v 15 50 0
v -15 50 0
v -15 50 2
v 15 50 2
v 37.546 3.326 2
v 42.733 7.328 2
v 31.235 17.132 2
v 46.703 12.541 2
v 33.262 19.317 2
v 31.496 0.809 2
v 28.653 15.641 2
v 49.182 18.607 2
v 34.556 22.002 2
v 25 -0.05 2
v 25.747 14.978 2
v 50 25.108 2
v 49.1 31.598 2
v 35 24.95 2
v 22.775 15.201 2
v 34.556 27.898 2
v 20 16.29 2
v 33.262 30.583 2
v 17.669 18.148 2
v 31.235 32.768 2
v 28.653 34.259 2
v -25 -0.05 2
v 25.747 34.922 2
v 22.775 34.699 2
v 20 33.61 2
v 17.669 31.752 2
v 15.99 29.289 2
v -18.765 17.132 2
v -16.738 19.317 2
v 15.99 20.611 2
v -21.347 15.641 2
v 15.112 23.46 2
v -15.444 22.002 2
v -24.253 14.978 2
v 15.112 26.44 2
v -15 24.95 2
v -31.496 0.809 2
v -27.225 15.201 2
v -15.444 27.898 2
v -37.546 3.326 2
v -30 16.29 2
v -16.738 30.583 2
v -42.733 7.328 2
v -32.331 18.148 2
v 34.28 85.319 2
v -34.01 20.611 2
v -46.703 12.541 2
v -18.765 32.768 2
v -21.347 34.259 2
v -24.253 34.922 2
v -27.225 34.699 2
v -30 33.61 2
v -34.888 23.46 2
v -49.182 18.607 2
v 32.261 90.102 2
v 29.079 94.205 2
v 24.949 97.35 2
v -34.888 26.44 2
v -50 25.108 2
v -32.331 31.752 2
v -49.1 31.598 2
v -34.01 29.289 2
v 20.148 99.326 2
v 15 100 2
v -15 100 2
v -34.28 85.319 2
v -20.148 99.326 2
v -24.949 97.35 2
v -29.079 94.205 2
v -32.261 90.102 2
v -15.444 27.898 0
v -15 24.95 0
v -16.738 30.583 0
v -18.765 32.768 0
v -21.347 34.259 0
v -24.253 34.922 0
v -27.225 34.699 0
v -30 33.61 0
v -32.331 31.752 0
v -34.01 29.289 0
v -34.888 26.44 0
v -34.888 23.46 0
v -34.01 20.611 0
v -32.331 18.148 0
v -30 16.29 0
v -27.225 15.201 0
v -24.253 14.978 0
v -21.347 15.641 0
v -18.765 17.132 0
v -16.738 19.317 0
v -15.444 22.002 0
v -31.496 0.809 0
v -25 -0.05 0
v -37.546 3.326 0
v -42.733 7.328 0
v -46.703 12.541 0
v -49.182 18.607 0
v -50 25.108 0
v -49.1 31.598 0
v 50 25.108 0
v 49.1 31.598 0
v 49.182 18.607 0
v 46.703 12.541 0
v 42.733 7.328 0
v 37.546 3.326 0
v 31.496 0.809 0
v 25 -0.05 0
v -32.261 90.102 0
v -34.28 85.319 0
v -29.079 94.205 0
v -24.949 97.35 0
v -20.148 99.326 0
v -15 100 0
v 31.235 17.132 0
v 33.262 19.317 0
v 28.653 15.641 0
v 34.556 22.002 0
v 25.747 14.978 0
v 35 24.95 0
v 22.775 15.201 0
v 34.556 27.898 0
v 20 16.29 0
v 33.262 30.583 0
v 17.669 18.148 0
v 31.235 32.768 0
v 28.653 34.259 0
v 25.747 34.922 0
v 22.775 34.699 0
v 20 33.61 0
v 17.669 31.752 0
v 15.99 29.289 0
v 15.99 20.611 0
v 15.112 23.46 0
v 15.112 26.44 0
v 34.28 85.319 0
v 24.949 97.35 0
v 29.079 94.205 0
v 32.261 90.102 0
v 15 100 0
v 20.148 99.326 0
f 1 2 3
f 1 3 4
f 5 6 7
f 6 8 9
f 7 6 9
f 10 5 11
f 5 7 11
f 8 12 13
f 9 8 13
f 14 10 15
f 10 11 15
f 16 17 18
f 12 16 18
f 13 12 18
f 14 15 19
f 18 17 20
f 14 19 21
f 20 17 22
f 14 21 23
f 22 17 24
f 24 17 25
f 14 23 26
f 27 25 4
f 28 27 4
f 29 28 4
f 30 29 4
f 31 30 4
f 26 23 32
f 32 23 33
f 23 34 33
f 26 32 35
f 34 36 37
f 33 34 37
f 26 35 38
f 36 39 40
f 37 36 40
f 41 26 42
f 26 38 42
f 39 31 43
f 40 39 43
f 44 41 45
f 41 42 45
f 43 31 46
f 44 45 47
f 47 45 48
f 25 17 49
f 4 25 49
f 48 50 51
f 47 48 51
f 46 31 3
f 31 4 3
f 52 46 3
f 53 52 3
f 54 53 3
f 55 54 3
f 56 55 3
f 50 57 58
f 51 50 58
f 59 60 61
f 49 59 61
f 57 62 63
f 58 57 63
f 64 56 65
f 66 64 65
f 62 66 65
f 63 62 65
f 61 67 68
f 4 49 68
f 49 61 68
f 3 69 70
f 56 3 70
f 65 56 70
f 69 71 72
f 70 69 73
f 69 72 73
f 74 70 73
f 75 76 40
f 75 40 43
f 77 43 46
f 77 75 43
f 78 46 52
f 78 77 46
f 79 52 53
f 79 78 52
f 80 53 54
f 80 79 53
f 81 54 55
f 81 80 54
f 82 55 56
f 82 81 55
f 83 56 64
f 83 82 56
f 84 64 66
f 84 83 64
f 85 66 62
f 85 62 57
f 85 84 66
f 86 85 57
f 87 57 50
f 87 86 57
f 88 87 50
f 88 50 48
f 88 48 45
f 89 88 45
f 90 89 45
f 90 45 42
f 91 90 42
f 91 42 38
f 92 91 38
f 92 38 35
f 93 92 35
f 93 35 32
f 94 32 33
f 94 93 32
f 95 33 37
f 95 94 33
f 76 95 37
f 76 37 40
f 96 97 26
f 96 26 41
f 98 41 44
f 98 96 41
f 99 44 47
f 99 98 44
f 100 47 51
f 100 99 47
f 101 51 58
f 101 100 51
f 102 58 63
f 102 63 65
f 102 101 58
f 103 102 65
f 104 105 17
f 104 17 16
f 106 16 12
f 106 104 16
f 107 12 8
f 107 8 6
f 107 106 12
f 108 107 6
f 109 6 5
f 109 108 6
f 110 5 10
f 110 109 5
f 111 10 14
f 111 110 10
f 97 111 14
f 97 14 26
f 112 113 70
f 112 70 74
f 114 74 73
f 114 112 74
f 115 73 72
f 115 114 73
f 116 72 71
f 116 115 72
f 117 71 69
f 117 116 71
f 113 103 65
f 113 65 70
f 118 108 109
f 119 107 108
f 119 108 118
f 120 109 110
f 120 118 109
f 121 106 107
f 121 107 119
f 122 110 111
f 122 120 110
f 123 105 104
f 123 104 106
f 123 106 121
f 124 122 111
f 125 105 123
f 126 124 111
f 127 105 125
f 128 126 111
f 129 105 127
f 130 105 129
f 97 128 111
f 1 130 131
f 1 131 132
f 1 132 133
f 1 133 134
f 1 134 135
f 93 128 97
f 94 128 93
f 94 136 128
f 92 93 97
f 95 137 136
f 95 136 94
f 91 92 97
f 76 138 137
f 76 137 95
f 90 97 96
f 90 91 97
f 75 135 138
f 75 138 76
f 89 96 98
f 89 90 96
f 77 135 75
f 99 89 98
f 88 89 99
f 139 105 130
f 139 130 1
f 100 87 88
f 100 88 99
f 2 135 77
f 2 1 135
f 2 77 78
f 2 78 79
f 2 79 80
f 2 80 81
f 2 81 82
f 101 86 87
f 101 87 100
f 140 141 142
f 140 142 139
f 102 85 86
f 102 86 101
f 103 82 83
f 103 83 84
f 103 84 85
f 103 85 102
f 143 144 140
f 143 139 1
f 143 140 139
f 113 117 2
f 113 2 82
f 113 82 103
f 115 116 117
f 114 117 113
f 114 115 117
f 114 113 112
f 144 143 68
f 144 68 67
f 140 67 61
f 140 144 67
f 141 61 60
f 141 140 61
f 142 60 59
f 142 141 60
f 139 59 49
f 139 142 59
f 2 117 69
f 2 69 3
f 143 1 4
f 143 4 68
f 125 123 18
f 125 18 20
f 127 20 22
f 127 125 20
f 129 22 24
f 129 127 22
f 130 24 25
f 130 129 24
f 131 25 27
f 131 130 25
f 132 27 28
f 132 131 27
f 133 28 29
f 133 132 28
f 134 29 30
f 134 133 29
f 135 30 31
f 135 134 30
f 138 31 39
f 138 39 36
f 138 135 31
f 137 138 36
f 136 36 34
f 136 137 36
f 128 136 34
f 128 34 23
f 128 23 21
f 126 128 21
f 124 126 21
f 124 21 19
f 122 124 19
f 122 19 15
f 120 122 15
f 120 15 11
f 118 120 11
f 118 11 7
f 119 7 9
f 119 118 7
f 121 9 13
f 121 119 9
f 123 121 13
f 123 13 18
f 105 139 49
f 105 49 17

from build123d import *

# Parameters (mm, degrees)
IZIM2_R                     = 10
Y_KSEKLIK_EKSTR_ZYON1_DEPTH = 2


with BuildPart() as part:
    # Çizim2 → Yükseklik-Ekstrüzyon1 (new body)
    with BuildSketch(Plane.XY):
        with BuildLine():
            Line((-15, 100), (-15, 50))
            Line((-15, 50), (15, 50))
            Line((15, 50), (15, 100))
            ThreePointArc((15, 100), (27.116614772, 95.911871243), (34.279801416, 85.318764647))
            Line((34.279801416, 85.318764647), (49.09975177, 31.59845198))
            ThreePointArc((49.09975177, 31.59845198), (44.889839054, 9.804227706), (25, -0.050003828))
            Line((25, -0.050003828), (-25, -0.050003828))
            ThreePointArc((-25, -0.050003828), (-44.889839054, 9.804227706), (-49.09975177, 31.59845198))
            Line((-49.09975177, 31.59845198), (-34.279801416, 85.318764647))
            ThreePointArc((-34.279801416, 85.318764647), (-27.116614772, 95.911871243), (-15, 100))
        make_face()
        with Locations((-25, 24.949996172)):
            Circle(IZIM2_R, mode=Mode.SUBTRACT)
        with Locations((25, 24.949996172)):
            Circle(IZIM2_R, mode=Mode.SUBTRACT)
    extrude(amount=Y_KSEKLIK_EKSTR_ZYON1_DEPTH)


solid = part.part
